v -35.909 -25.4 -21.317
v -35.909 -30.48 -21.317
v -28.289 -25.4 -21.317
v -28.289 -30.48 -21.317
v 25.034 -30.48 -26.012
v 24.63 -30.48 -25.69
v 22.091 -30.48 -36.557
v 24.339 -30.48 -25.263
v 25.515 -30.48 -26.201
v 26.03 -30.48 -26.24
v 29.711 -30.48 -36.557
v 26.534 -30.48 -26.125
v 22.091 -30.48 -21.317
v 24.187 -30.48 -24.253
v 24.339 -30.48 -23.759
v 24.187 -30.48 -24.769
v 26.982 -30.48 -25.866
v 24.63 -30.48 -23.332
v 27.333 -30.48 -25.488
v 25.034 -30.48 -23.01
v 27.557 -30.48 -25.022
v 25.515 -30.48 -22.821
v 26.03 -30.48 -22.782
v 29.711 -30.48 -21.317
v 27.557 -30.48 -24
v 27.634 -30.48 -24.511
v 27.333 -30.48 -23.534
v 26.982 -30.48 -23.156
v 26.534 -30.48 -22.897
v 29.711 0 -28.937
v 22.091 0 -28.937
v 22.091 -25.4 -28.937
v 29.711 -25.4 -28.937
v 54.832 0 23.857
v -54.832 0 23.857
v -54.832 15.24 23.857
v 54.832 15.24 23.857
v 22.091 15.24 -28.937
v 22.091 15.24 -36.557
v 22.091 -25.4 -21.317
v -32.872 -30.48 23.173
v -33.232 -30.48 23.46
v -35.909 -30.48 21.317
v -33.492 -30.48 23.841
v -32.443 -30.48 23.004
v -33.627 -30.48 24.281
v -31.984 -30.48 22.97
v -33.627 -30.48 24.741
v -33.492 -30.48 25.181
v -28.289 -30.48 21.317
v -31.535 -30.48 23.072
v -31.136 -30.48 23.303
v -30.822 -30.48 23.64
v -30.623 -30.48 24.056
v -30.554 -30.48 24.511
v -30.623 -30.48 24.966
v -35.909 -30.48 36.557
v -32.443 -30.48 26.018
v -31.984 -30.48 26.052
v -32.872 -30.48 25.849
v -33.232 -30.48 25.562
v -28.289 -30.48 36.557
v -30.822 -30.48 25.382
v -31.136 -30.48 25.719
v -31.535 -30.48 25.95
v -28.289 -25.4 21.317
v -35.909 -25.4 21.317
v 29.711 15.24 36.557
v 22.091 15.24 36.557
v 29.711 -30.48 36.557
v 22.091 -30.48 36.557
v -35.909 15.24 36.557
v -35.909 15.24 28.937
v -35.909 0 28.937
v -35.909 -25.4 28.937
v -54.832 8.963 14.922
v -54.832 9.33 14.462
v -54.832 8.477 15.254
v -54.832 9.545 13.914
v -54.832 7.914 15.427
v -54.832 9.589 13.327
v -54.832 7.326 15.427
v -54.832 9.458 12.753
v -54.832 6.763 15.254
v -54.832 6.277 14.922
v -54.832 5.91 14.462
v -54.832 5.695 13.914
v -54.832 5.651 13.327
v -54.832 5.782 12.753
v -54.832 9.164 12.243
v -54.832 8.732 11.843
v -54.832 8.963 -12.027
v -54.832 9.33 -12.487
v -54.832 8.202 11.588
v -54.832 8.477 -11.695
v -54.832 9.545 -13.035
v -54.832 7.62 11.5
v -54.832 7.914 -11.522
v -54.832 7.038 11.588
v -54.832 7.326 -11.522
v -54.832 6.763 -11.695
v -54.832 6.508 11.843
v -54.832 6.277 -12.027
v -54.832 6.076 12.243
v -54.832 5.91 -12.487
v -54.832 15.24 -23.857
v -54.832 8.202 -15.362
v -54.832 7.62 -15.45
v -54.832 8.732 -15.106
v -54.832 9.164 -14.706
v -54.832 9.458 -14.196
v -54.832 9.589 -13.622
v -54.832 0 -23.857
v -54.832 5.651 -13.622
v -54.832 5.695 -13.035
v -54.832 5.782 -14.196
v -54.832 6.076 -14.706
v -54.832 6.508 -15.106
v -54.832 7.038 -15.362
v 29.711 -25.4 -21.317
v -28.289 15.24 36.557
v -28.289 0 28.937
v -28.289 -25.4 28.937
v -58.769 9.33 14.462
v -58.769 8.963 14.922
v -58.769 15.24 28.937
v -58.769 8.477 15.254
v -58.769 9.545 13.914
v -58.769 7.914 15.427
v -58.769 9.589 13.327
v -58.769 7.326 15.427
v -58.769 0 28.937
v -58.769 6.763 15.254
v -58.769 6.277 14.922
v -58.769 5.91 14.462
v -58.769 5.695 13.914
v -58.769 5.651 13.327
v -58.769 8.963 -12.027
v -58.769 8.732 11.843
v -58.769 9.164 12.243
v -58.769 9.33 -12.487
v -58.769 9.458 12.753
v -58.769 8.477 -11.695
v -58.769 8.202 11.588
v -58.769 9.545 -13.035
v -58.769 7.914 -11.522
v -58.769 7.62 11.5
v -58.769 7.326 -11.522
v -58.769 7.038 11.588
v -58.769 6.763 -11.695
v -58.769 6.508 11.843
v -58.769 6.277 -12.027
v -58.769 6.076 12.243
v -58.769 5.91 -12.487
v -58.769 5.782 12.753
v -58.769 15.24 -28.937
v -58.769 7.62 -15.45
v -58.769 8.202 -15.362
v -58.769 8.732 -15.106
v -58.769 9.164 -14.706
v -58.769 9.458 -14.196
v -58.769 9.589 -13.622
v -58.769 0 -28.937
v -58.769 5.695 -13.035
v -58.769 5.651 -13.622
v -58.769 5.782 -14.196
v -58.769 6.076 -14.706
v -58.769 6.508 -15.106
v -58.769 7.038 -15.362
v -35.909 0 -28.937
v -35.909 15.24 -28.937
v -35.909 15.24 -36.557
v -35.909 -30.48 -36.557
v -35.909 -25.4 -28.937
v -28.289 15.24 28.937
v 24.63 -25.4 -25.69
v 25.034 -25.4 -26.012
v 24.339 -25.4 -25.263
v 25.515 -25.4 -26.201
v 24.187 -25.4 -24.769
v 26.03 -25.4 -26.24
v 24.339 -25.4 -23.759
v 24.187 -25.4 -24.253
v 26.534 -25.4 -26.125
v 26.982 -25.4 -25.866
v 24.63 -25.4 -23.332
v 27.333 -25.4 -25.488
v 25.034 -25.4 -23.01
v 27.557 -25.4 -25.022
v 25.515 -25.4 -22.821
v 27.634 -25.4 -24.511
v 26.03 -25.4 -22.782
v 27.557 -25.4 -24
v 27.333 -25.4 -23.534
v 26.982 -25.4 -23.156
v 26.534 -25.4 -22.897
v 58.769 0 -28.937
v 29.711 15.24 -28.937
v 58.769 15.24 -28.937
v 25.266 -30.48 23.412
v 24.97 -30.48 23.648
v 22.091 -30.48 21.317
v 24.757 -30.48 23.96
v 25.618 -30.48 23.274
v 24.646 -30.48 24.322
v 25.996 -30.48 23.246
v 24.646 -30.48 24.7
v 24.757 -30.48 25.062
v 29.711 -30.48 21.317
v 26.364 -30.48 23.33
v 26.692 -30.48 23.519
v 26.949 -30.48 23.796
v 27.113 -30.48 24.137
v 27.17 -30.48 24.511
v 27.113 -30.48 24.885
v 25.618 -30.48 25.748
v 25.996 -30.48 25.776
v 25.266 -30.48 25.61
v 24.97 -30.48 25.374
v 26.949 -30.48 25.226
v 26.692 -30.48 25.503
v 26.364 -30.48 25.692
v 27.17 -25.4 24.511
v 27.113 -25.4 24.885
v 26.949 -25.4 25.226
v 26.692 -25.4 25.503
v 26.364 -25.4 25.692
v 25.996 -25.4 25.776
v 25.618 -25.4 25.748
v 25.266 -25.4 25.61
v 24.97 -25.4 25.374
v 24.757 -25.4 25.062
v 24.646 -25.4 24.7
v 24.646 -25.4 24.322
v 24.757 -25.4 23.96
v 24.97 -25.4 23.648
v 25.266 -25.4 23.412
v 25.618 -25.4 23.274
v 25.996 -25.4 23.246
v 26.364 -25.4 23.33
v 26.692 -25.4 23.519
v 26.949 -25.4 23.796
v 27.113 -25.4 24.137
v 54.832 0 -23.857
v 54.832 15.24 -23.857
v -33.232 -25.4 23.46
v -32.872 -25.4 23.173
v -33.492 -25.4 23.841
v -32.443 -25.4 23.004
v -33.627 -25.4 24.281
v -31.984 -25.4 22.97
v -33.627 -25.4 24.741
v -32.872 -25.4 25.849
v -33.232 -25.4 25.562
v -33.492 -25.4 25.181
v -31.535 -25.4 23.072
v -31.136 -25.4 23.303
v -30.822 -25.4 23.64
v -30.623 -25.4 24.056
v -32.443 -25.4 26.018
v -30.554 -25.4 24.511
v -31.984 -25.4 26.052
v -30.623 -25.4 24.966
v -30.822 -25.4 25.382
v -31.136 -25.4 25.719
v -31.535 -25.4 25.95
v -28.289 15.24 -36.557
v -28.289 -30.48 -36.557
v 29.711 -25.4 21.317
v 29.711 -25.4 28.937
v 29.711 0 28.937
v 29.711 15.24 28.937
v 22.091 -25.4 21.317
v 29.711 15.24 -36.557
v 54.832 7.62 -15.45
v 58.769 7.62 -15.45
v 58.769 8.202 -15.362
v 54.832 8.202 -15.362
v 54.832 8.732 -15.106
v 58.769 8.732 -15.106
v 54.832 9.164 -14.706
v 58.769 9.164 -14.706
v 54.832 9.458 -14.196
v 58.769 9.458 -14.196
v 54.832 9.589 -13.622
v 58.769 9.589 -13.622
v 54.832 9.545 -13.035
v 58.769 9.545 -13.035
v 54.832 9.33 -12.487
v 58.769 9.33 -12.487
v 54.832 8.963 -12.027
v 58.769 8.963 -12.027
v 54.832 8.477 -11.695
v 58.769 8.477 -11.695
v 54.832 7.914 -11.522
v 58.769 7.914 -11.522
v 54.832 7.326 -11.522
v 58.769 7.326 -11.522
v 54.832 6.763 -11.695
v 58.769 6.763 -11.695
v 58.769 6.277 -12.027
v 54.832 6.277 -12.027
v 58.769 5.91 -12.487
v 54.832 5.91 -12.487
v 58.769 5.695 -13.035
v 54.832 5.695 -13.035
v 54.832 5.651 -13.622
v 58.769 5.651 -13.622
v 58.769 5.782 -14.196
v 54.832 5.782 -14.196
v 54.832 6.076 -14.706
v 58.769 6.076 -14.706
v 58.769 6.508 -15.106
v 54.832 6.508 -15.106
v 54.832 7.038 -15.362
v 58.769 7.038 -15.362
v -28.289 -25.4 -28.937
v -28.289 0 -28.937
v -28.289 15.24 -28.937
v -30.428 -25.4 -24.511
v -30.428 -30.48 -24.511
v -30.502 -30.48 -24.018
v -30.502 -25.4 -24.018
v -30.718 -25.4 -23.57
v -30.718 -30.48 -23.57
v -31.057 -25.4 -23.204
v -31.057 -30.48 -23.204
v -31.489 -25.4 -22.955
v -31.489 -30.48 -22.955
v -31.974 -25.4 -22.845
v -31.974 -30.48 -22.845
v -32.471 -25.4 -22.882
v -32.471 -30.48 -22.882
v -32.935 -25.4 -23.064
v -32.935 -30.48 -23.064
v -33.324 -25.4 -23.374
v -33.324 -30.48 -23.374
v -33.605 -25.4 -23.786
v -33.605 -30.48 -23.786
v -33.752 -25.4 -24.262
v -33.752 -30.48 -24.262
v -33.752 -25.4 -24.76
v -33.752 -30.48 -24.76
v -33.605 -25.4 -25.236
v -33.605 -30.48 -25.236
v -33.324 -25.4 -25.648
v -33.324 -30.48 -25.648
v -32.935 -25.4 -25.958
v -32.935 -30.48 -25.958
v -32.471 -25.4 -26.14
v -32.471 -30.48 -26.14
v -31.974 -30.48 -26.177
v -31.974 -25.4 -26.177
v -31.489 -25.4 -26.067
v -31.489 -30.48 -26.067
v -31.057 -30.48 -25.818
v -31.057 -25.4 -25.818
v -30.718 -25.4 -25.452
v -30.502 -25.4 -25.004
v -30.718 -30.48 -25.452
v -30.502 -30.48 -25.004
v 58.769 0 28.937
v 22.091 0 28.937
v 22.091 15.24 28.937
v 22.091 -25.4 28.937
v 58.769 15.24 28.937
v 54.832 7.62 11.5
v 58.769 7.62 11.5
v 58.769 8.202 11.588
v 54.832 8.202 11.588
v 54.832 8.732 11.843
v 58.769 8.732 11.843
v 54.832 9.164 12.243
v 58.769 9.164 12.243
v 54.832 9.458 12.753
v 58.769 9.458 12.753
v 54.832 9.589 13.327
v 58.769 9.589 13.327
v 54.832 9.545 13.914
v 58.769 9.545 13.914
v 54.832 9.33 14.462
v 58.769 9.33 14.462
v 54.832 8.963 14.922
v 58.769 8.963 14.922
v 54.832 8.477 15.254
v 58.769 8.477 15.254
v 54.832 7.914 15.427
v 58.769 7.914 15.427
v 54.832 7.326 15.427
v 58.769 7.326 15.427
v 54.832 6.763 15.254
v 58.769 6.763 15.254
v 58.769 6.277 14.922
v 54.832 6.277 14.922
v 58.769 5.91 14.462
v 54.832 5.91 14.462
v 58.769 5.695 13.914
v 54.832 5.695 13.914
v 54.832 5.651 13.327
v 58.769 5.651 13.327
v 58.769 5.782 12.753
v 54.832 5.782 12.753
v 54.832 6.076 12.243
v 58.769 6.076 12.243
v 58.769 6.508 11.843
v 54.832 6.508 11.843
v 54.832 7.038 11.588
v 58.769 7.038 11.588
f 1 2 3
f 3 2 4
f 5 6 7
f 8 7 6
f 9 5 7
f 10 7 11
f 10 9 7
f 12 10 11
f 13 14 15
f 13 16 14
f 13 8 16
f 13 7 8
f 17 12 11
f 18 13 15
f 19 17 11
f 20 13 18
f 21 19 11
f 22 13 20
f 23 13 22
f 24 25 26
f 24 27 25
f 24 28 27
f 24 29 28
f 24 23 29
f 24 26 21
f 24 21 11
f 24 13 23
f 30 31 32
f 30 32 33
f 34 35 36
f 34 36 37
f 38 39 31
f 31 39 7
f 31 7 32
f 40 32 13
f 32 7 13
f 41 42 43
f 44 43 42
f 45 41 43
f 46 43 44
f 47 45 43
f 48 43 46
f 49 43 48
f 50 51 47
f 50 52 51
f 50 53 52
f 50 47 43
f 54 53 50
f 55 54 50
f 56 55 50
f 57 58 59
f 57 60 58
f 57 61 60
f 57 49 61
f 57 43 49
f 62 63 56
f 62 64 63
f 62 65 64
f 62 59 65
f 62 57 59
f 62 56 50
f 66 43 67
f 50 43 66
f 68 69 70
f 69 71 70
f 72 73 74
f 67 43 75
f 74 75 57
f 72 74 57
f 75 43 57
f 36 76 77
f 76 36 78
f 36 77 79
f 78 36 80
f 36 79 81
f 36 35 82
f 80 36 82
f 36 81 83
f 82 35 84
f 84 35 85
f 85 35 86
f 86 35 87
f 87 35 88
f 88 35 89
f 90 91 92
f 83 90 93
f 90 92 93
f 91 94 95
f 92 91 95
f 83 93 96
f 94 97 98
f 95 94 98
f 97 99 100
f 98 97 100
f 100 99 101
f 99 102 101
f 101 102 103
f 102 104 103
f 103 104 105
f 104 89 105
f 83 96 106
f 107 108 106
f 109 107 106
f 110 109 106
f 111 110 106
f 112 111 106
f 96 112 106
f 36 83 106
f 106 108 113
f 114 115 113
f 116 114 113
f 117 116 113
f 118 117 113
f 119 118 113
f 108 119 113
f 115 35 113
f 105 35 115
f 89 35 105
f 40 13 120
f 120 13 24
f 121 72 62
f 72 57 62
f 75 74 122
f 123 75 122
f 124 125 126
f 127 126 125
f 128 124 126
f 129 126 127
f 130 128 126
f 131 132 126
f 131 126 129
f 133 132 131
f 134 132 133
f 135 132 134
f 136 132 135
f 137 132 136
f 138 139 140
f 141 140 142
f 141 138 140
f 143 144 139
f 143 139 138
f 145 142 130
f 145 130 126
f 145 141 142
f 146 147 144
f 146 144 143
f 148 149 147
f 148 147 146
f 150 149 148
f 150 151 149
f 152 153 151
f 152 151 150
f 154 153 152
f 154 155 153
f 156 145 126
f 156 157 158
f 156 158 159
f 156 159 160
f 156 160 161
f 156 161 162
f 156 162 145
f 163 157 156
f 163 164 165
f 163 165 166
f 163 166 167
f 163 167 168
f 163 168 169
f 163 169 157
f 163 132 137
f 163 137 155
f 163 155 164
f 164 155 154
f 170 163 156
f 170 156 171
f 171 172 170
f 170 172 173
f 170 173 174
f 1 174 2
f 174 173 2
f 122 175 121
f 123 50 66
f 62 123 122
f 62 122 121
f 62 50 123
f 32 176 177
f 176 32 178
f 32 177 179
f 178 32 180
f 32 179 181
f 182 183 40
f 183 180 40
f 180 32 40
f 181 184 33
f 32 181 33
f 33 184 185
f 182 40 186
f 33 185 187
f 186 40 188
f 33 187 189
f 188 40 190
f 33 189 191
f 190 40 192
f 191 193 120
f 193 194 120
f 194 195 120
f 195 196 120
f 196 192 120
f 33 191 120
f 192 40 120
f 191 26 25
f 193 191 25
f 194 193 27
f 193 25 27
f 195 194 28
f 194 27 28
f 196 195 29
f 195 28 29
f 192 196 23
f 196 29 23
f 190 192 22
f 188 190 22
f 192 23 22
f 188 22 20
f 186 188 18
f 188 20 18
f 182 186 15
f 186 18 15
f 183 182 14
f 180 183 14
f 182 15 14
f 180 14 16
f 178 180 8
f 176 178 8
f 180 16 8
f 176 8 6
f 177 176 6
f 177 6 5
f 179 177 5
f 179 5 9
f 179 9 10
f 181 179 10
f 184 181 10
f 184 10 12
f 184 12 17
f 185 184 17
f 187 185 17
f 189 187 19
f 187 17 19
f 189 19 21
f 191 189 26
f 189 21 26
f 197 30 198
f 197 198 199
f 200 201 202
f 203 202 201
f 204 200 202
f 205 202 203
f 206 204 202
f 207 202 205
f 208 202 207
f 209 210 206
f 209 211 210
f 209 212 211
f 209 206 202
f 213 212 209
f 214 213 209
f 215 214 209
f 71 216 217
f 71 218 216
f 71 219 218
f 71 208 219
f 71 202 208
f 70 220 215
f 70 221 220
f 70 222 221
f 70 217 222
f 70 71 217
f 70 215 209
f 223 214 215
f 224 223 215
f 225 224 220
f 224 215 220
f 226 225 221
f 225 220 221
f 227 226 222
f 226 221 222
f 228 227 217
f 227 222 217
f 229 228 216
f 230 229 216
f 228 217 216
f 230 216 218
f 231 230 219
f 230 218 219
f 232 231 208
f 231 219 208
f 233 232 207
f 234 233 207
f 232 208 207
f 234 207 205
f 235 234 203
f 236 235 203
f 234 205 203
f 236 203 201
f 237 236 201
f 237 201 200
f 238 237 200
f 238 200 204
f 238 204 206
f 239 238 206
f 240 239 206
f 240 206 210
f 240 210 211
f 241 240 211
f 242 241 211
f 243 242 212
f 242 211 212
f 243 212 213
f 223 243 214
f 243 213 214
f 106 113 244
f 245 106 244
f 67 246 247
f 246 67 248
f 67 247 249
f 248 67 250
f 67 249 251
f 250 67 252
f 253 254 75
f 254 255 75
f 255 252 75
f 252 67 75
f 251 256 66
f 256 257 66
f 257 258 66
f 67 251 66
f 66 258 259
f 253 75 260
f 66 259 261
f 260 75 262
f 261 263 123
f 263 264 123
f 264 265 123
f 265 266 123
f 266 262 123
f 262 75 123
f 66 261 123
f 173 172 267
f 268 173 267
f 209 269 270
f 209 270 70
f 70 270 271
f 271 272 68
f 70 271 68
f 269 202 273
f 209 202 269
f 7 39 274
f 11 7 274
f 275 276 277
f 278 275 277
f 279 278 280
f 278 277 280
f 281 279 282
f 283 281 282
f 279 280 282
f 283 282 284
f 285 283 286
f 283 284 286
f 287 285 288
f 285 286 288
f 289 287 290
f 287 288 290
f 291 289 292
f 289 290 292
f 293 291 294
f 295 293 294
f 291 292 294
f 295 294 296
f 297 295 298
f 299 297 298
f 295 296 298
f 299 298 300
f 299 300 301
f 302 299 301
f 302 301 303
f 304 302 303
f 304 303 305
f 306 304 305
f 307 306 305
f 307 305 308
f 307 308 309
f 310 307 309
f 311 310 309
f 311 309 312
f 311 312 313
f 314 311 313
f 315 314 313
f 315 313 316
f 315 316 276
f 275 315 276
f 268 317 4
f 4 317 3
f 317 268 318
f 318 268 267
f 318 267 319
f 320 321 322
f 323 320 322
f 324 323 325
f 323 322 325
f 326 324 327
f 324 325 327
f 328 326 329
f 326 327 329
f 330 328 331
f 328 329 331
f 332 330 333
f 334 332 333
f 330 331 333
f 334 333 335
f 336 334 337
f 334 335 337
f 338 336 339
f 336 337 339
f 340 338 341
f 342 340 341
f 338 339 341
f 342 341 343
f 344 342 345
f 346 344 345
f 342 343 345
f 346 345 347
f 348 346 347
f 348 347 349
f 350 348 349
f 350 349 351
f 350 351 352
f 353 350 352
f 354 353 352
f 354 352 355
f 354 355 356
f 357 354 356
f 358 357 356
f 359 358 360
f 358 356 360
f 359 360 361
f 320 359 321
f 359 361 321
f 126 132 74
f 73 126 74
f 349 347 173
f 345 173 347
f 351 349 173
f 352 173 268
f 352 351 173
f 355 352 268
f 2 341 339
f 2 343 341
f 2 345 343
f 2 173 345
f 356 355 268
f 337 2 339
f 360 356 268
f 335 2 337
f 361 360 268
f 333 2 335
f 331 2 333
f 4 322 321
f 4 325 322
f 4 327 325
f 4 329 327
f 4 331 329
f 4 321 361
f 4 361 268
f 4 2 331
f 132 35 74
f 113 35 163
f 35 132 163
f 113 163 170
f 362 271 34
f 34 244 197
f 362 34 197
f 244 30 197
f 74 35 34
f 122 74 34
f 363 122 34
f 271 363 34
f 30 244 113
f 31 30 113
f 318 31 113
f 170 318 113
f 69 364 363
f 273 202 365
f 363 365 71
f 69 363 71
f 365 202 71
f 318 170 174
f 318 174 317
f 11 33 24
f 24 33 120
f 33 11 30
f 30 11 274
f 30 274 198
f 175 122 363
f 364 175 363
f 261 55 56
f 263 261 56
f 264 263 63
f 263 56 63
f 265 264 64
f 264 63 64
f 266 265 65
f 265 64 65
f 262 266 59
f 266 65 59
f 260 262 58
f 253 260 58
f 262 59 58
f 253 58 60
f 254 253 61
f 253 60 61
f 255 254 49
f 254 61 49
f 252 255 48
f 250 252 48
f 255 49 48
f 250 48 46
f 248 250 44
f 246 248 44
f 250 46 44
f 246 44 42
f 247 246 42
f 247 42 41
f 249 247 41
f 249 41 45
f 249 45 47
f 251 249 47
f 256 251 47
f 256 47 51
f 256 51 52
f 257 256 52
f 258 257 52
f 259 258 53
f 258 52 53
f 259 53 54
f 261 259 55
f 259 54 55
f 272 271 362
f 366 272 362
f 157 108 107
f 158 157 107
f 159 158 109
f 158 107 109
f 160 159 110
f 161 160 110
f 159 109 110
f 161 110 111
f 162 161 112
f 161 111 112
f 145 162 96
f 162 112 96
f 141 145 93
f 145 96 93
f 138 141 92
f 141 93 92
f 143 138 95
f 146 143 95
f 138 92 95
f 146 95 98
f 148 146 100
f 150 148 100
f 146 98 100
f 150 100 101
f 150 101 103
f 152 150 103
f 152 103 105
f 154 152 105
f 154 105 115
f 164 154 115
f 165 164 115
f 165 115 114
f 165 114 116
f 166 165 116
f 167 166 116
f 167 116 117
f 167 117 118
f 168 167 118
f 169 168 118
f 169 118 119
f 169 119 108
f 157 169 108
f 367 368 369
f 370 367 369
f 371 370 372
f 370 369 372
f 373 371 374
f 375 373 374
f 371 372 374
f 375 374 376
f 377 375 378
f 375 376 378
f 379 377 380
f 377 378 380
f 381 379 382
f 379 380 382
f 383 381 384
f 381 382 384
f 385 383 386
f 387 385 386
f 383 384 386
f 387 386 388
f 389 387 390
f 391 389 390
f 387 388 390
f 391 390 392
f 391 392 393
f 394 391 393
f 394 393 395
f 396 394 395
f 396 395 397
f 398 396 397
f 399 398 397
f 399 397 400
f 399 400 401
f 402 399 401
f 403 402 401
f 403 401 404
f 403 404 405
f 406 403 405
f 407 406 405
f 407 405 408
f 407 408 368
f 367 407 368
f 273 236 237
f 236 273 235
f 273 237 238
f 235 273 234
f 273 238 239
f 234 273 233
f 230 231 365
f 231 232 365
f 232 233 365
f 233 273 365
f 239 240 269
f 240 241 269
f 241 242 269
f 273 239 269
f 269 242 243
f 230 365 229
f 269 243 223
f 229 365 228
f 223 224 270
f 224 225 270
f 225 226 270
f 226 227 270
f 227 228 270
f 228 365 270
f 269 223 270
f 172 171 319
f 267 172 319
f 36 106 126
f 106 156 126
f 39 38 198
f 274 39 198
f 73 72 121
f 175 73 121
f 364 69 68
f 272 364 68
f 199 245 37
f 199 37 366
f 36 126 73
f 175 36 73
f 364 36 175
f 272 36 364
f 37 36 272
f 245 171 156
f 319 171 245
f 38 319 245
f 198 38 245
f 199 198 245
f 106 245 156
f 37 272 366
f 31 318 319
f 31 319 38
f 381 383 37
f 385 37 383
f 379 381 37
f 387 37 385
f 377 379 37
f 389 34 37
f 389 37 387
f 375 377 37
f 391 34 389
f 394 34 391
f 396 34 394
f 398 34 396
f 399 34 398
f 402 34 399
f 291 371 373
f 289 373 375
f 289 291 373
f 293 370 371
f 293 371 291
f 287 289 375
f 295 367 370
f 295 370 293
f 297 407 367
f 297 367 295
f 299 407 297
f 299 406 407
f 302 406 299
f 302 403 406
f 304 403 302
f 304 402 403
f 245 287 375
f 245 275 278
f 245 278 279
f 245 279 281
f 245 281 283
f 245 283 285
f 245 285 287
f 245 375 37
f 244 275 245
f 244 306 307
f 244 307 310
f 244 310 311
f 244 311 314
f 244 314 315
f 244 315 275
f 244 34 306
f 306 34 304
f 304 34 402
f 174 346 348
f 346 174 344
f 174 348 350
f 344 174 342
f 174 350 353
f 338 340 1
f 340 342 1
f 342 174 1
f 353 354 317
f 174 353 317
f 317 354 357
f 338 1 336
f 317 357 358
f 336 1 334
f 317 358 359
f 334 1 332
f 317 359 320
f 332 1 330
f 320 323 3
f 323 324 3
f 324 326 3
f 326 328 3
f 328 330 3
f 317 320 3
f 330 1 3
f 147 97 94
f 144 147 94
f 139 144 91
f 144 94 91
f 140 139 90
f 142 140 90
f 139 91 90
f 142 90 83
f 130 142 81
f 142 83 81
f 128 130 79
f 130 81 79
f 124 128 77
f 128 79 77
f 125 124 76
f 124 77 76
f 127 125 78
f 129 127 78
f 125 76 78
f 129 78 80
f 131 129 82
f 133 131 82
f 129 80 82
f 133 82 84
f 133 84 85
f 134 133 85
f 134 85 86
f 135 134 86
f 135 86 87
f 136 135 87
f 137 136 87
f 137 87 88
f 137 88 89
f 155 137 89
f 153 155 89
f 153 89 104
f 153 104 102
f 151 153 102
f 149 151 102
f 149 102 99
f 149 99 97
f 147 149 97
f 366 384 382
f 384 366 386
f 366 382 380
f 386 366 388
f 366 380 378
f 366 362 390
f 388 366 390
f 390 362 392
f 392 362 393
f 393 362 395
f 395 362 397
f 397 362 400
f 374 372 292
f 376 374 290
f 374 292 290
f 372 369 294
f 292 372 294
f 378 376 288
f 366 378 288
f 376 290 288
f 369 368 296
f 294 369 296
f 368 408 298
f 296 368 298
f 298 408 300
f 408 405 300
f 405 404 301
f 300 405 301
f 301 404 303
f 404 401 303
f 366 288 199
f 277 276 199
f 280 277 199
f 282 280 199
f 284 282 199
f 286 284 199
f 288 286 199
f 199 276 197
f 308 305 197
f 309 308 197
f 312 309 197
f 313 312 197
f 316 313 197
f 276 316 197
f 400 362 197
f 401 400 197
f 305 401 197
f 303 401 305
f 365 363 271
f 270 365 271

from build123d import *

# Parameters (mm, degrees)
SKETCH1_W                = 117.5385
SKETCH1_H                = 57.8739
SKETCH1_W_2              = 109.6645
SKETCH1_H_2              = 47.7139
BOSS_EXTRUDE1_DEPTH      = 15.24
SKETCH2_R                = 1.97485
CUT_EXTRUDE1_DEPTH       = 129.032
SKETCH3_W                = 7.62
SKETCH3_H                = 7.62
BOSS_EXTRUDE2_DEPTH      = 30.48
BOSS_EXTRUDE2_DEPTH_BACK = 15.24
SKETCH4_W                = 7.62
SKETCH4_H                = 7.62
SKETCH4_R                = 1.545344409
SKETCH4_R_2              = 1.269040072
SKETCH4_R_3              = 1.671154259
SKETCH4_R_4              = 1.733603543
BOSS_EXTRUDE3_DEPTH      = 5.08


with BuildPart() as part:
    # Sketch1 → Boss-Extrude1 (new body)
    with BuildSketch(Plane(origin=(0, 0, 0), x_dir=(1, 0, 0), z_dir=(0, 1, 0))):
        Rectangle(SKETCH1_W, SKETCH1_H)
        Rectangle(SKETCH1_W_2, SKETCH1_H_2, mode=Mode.SUBTRACT)
    extrude(amount=BOSS_EXTRUDE1_DEPTH)

    # Sketch2 → Cut-Extrude1 (cut)
    with BuildSketch(Plane(origin=(58.76925, 0, 0), x_dir=(0, 0, -1), z_dir=(1, 0, 0))):
        with Locations((-13.4747, 7.62)):
            Circle(SKETCH2_R)
        with Locations((13.4747, 7.62)):
            Circle(SKETCH2_R)
    extrude(amount=-CUT_EXTRUDE1_DEPTH, mode=Mode.SUBTRACT)

    # Sketch3 → Boss-Extrude2 (add, two sides)
    with BuildSketch(Plane.XZ) as boss_extrude2_sk:
        with Locations((-32.09925, 32.74695)):
            Rectangle(SKETCH3_W, SKETCH3_H)
        with Locations((25.90074068, 32.74695)):
            Rectangle(SKETCH3_W, SKETCH3_H)
        with Locations((-32.09925, -32.74695)):
            Rectangle(SKETCH3_W, SKETCH3_H)
        with Locations((25.90074068, -32.74695)):
            Rectangle(SKETCH3_W, SKETCH3_H)
    extrude(amount=BOSS_EXTRUDE2_DEPTH)
    extrude(boss_extrude2_sk.sketch, amount=-BOSS_EXTRUDE2_DEPTH_BACK)

    # Sketch4 → Boss-Extrude3 (add)
    with BuildSketch(Plane.XZ.offset(30.48)):
        with Locations((-32.09925, 25.12695)):
            Rectangle(SKETCH4_W, SKETCH4_H)
        with Locations((-32.09925, 24.511)):
            Circle(SKETCH4_R, mode=Mode.SUBTRACT)
        with Locations((25.90074068, 25.12695)):
            Rectangle(SKETCH4_W, SKETCH4_H)
        with Locations((25.90074068, 24.511)):
            Circle(SKETCH4_R_2, mode=Mode.SUBTRACT)
        with Locations((-32.09925, -25.12695)):
            Rectangle(SKETCH4_W, SKETCH4_H)
        with Locations((-32.09925, -24.511)):
            Circle(SKETCH4_R_3, mode=Mode.SUBTRACT)
        with Locations((25.90074068, -25.12695)):
            Rectangle(SKETCH4_W, SKETCH4_H)
        with Locations((25.90074068, -24.511)):
            Circle(SKETCH4_R_4, mode=Mode.SUBTRACT)
    extrude(amount=-BOSS_EXTRUDE3_DEPTH)


solid = part.part
